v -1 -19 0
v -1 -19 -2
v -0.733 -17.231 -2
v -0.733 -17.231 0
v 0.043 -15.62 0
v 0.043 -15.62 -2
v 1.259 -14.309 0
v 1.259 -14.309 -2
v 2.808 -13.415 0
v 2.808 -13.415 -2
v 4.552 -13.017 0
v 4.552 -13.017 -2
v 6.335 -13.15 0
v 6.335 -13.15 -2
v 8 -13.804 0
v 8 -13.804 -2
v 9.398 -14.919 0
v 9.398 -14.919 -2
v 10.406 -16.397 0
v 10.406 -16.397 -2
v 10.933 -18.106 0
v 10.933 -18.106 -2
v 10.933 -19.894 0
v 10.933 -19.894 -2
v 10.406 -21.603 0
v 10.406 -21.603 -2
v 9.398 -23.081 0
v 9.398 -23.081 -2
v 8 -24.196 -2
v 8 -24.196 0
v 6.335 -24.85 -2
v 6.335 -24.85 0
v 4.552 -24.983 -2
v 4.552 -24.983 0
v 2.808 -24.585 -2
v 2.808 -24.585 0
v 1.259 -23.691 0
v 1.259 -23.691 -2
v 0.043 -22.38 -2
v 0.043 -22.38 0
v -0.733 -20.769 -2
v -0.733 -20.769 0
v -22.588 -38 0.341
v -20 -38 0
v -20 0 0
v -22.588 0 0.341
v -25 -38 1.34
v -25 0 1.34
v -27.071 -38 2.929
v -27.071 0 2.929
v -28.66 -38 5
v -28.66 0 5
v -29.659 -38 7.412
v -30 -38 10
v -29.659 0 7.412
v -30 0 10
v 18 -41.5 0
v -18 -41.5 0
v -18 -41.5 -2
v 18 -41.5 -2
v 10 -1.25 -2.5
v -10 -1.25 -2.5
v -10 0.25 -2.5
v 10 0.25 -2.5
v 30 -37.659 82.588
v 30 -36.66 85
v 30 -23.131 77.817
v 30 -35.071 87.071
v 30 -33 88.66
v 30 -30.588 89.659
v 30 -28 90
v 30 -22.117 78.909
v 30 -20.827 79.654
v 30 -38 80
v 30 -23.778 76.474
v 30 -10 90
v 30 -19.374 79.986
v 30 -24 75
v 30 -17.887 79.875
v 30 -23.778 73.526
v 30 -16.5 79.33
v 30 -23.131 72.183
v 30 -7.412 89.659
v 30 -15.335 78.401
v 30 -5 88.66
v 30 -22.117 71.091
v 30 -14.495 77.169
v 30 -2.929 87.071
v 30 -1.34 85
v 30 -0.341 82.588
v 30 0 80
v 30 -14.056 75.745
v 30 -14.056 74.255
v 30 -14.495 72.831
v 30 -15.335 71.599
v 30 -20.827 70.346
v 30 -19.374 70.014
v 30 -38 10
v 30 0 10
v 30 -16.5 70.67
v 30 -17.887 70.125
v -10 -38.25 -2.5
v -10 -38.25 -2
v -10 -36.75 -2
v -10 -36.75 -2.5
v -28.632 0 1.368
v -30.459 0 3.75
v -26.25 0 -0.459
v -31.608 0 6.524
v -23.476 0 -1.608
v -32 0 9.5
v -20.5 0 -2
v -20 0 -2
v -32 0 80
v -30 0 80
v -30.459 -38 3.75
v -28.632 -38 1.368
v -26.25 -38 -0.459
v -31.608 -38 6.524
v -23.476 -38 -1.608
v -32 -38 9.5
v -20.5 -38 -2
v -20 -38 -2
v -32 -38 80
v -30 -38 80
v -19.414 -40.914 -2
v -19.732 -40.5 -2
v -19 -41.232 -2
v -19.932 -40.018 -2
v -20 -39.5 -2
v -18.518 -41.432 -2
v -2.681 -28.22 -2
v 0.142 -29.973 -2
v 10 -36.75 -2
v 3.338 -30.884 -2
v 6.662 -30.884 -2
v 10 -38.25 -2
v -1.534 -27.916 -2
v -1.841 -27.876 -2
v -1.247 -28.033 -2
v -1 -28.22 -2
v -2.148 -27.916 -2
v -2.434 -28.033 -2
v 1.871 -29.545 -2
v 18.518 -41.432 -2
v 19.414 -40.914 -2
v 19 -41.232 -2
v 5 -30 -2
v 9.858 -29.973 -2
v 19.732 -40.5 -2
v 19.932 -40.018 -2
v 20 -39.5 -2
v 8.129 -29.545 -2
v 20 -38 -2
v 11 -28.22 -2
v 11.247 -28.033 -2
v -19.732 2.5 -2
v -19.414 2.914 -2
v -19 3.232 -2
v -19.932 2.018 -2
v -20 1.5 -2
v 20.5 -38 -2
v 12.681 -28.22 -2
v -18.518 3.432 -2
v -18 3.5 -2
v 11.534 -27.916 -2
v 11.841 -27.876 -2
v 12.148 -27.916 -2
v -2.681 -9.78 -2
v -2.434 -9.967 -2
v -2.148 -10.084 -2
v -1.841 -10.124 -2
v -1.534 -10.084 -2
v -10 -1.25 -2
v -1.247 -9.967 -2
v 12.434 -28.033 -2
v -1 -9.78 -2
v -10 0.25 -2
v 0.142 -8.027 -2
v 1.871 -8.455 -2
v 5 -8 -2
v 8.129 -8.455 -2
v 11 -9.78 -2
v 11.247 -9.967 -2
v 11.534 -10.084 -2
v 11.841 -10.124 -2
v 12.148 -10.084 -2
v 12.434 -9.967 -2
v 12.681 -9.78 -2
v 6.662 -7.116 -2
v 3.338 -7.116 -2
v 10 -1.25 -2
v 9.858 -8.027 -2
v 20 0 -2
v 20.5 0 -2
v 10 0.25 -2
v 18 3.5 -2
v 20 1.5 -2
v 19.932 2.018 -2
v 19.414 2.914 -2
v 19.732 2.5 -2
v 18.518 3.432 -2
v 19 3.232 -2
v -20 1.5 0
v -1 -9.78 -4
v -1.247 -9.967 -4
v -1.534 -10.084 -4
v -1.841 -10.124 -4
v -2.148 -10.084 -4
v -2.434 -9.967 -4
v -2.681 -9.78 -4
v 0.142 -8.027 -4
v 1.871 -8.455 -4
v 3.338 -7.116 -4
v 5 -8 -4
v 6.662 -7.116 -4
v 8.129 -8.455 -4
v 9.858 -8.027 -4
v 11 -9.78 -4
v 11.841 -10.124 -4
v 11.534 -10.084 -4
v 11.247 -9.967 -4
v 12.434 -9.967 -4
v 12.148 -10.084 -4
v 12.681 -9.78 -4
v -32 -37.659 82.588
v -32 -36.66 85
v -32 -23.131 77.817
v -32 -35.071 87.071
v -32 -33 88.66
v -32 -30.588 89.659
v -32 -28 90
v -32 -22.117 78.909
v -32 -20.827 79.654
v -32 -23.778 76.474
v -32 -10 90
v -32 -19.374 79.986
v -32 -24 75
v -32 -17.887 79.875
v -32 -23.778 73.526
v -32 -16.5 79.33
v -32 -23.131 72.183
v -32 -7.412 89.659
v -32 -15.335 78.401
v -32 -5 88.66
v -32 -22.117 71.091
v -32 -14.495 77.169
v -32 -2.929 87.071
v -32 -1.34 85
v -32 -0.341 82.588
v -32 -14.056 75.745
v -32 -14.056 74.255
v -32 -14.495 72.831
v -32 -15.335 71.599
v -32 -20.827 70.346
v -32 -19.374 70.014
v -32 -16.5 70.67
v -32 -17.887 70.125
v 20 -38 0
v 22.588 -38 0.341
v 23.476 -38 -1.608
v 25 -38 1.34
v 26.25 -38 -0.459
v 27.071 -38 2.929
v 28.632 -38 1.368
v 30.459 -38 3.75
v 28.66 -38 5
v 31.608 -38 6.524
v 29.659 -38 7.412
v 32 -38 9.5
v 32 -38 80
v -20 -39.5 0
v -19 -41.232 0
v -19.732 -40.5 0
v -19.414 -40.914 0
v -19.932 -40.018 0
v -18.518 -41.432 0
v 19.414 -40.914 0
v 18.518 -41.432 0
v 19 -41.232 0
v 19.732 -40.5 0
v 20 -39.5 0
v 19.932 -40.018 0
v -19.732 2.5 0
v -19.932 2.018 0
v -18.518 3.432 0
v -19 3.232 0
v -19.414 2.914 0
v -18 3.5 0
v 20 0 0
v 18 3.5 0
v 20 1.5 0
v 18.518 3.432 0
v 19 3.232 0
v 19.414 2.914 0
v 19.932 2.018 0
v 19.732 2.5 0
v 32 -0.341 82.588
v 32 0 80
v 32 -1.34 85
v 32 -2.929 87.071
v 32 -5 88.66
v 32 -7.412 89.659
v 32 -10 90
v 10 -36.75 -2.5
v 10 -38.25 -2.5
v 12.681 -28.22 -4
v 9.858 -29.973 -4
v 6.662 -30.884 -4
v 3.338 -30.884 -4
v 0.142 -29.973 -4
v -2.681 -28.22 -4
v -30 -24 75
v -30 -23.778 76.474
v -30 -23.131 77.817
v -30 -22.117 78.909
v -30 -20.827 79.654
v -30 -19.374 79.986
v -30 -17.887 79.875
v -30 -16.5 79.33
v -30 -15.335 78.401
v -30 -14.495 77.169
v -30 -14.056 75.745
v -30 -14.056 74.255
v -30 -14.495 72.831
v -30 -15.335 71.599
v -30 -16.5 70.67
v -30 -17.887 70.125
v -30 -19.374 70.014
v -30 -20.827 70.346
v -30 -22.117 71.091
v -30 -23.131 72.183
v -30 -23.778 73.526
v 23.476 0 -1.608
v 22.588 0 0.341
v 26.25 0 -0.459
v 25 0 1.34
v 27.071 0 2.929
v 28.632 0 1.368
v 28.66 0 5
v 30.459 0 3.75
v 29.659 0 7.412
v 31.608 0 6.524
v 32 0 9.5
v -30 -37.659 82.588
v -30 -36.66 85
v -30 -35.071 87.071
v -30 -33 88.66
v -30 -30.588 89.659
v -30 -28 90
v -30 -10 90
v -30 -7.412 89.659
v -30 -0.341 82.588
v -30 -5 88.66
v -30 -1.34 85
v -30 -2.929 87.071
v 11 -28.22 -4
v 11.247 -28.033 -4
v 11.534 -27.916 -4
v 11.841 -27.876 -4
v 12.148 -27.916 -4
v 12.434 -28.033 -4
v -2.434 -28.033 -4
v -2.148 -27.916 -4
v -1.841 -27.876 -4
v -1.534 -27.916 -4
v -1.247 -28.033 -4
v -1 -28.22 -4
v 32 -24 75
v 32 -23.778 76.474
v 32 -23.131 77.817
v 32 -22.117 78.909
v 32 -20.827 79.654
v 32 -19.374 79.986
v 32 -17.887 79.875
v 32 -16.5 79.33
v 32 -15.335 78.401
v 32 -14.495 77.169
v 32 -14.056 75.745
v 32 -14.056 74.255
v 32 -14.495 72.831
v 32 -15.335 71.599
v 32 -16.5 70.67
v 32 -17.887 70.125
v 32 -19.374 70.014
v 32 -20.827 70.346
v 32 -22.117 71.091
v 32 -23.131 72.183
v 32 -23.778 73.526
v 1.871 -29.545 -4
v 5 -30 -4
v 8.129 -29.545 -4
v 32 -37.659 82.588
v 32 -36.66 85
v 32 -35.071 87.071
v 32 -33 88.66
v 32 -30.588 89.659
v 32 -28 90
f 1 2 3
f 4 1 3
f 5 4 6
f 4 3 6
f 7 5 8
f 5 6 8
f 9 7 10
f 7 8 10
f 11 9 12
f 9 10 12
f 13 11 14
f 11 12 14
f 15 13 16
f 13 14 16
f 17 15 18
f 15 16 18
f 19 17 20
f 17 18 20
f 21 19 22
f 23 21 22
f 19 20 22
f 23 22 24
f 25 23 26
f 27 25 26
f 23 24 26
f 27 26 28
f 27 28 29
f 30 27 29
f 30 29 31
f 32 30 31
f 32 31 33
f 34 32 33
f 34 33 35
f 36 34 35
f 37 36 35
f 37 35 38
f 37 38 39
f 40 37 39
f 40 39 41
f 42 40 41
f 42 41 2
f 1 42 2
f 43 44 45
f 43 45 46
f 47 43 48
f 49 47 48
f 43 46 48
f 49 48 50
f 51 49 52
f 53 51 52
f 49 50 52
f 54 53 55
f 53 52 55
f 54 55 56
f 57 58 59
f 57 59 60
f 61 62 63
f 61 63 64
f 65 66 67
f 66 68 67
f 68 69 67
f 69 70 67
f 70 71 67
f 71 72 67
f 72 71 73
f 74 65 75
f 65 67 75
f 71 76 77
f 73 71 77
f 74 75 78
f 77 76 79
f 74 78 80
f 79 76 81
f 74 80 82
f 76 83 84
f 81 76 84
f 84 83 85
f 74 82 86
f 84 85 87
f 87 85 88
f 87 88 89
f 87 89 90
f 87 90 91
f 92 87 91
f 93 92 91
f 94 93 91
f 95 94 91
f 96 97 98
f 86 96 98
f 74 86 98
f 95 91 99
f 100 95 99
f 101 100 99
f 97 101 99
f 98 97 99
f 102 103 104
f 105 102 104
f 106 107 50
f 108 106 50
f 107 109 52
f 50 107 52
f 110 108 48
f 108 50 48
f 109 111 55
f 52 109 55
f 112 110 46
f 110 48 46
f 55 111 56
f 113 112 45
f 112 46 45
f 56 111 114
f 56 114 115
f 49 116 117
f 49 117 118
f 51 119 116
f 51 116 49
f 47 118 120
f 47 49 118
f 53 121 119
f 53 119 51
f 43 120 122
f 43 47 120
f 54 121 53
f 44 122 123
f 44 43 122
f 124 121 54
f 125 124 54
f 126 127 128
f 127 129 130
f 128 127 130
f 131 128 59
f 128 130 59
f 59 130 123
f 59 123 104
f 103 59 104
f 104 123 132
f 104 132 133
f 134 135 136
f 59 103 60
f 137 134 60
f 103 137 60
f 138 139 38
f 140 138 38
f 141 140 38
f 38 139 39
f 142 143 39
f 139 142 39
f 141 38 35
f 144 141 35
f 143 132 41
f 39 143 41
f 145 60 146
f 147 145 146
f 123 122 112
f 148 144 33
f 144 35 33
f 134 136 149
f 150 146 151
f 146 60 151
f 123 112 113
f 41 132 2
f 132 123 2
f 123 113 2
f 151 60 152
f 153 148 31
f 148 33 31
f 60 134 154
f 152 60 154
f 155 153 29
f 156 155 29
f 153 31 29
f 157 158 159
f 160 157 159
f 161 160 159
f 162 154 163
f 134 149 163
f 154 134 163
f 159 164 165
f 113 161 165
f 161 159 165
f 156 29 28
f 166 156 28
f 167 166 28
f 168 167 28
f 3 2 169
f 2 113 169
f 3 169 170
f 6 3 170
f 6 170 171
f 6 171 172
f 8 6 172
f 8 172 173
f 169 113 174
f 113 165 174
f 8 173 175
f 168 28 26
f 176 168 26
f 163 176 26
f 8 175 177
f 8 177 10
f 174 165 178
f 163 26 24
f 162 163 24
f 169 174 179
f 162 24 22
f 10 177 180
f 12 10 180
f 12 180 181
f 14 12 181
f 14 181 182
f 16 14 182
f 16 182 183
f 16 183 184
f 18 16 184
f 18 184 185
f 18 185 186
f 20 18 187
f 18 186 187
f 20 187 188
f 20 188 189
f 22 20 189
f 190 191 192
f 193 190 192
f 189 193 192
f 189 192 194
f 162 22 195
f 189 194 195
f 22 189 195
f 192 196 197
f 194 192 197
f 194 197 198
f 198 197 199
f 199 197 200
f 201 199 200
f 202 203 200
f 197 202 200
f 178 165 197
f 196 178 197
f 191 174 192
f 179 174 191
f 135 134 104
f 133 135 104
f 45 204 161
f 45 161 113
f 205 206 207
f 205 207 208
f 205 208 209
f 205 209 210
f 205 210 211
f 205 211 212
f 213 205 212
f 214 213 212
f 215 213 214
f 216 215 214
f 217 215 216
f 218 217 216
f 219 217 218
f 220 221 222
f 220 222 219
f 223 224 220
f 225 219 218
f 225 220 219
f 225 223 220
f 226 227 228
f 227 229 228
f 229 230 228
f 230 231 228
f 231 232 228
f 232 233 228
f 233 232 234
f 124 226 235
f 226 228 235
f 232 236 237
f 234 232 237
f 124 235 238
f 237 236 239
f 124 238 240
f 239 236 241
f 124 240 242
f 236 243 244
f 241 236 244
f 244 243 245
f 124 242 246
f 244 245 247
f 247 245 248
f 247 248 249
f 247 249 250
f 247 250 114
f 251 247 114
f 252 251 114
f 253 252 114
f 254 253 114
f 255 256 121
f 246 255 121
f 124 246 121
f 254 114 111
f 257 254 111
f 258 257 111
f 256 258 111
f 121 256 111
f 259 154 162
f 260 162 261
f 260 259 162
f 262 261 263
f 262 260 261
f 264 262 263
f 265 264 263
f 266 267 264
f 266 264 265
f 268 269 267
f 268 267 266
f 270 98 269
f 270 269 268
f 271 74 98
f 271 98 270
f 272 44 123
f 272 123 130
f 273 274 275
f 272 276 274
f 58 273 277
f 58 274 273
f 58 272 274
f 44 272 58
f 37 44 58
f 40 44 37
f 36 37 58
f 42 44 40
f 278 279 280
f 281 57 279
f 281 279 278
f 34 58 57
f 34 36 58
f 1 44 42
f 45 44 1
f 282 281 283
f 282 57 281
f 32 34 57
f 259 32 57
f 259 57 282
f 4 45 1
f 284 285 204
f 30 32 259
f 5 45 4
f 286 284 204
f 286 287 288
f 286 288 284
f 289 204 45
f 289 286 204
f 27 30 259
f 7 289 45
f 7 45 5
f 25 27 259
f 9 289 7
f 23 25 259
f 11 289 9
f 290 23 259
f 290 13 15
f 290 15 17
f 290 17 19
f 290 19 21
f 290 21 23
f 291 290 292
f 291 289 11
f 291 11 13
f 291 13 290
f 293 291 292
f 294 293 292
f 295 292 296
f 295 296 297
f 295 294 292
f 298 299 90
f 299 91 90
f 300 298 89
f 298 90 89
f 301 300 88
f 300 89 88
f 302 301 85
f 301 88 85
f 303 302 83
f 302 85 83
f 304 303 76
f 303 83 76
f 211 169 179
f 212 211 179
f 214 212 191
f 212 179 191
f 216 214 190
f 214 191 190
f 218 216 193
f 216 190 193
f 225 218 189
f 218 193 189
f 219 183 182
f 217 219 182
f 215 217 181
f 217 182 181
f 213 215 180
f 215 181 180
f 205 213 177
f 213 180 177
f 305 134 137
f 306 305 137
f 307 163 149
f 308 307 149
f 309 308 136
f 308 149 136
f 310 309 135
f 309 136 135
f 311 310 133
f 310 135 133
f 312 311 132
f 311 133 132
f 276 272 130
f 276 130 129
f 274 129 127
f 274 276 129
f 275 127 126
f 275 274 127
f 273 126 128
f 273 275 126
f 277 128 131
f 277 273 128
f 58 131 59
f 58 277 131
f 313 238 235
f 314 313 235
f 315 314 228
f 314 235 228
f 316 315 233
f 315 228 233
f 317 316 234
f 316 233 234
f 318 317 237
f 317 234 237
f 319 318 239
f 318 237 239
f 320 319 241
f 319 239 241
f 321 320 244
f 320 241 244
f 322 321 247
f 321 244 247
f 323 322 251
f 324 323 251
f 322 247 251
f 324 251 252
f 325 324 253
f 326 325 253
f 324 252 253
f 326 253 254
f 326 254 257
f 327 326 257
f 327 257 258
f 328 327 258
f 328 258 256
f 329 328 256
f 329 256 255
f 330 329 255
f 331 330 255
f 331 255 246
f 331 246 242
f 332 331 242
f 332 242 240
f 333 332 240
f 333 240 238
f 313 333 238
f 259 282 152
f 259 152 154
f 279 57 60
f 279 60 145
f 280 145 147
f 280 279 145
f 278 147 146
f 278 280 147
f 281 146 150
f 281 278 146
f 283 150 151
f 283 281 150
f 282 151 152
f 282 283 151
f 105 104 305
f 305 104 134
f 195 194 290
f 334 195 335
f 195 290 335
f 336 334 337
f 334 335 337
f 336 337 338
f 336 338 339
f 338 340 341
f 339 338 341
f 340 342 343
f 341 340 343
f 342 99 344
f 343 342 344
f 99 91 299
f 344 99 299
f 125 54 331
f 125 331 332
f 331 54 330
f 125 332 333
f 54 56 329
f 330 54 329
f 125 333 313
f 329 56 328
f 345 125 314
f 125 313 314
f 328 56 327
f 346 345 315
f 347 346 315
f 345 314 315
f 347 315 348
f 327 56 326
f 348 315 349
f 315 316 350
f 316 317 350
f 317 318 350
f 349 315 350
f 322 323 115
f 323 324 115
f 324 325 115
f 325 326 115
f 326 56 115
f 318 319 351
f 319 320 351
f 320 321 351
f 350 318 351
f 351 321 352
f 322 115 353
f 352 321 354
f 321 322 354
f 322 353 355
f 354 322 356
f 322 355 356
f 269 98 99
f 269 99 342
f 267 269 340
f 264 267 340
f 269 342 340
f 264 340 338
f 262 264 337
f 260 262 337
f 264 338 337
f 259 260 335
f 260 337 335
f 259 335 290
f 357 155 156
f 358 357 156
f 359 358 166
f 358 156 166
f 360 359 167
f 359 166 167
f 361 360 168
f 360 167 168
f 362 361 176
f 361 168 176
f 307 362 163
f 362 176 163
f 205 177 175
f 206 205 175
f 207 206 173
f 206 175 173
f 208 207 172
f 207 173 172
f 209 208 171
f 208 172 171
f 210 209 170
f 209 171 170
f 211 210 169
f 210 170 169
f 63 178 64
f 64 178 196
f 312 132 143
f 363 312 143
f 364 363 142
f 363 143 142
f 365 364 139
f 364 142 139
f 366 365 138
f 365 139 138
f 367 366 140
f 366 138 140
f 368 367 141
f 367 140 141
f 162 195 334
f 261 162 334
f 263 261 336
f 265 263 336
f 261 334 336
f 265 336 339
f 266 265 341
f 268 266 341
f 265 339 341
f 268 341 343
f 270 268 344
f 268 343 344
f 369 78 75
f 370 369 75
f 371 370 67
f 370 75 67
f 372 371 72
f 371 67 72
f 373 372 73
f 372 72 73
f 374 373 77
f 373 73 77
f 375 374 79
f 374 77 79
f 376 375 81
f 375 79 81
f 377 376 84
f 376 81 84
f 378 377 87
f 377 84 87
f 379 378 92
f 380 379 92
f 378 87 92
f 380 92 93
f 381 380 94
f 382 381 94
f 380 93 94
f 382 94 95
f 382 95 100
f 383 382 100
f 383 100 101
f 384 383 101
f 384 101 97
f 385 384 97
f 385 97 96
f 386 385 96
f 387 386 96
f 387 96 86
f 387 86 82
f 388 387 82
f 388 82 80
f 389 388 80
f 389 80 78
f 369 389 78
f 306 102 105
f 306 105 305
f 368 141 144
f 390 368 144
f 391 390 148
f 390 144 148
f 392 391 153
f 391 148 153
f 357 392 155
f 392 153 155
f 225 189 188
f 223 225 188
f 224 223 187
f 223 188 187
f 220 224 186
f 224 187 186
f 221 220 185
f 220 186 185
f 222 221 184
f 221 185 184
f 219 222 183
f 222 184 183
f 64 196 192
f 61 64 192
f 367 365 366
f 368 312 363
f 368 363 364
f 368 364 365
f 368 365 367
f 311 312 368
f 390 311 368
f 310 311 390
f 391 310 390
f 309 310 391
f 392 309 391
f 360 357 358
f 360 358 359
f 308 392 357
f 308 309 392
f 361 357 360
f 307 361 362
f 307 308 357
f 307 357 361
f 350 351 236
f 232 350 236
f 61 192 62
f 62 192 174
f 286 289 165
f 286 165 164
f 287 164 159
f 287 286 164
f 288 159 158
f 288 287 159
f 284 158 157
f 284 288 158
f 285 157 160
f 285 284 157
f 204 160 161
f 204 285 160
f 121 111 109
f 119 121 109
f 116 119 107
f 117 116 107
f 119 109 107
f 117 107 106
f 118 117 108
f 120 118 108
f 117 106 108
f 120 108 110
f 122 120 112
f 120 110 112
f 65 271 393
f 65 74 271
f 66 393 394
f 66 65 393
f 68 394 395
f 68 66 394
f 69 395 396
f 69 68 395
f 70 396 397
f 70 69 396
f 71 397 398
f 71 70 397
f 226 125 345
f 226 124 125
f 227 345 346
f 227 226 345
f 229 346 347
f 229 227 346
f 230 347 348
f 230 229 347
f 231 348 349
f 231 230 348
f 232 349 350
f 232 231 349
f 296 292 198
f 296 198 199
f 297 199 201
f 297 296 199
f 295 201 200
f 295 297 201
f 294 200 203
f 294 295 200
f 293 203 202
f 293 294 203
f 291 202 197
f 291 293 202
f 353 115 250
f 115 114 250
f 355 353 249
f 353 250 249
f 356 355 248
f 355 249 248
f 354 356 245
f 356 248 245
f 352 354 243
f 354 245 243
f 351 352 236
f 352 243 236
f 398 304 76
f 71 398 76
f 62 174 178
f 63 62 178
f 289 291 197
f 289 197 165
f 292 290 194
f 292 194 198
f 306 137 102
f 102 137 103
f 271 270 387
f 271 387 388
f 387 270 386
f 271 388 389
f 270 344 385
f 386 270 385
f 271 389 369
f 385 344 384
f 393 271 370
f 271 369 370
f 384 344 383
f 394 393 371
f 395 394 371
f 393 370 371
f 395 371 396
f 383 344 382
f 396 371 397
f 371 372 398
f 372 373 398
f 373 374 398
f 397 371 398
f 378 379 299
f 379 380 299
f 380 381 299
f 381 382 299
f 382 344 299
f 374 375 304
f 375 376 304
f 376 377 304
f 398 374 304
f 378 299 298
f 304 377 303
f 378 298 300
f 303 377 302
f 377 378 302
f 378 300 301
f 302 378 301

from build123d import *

# Parameters (mm, degrees)
F1_DEPTH  = 38
F3_D      = 12
F5_DEPTH  = 2
F6_R      = 10
F8_DEPTH  = 0.5
F10_DEPTH = 2
F12_D     = 10


with BuildPart() as f1:
    # F0 (on Front) → F1 (new body)
    with BuildSketch(Plane.XZ):
        with BuildLine():
            Line((20, 0), (0, 0))
            Line((0, 0), (-20, 0))
            ThreePointArc((-20, 0), (-27.0710678119, 2.9289321881), (-30, 10))
            Line((-30, 10), (-30, 90))
            Line((-30, 90), (-32, 90))
            Line((-32, 90), (-32, 9.5))
            ThreePointArc((-32, 9.5), (-28.6317279836, 1.3682720164), (-20.5, -2))
            Line((-20.5, -2), (0, -2))
            Line((0, -2), (20.5, -2))
            ThreePointArc((20.5, -2), (28.6317279836, 1.3682720164), (32, 9.5))
            Line((32, 9.5), (32, 90))
            Line((32, 90), (30, 90))
            Line((30, 90), (30, 10))
            ThreePointArc((30, 10), (27.0710678119, 2.9289321881), (20, 0))
        make_face()
    extrude(amount=F1_DEPTH)

    # F3 (through all)
    with Locations(Plane.XY):
        with Locations((5, -19)):
            Hole(F3_D / 2)

    # F4 (on face) → F5 (join)
    with BuildSketch(Plane(origin=(0, 0, -2), x_dir=(1, 0, 0), z_dir=(0, 0, -1))):
        with BuildLine():
            ThreePointArc((-1, 28.2195444573), (5, 30), (11, 28.2195444573))
            ThreePointArc((11, 28.2195444573), (11.8405728739, 27.8759539642), (12.6811457479, 28.2195444573))
            ThreePointArc((12.6811457479, 28.2195444573), (5, 31), (-2.6811457479, 28.2195444573))
            ThreePointArc((-2.6811457479, 28.2195444573), (-1.8405728739, 27.8759539642), (-1, 28.2195444573))
        make_face()
        with BuildLine():
            ThreePointArc((11, 9.7804555427), (5, 8), (-1, 9.7804555427))
            ThreePointArc((-1, 9.7804555427), (-1.8405728739, 10.1240460358), (-2.6811457479, 9.7804555427))
            ThreePointArc((-2.6811457479, 9.7804555427), (5, 7), (12.6811457479, 9.7804555427))
            ThreePointArc((12.6811457479, 9.7804555427), (11.8405728739, 10.1240460358), (11, 9.7804555427))
        make_face()
    extrude(amount=F5_DEPTH)

    # F6
    f6_edges = [f1.edges().sort_by_distance(p)[0] for p in [
        (-31, -38, 90),
        (31, -38, 90),
        (-31, 0, 90),
        (31, 0, 90),
    ]]
    fillet(f6_edges, radius=F6_R)

    # F7 (on face) → F8 (join)
    with BuildSketch(Plane(origin=(0, 0, -2), x_dir=(1, 0, 0), z_dir=(0, 0, -1))):
        Polygon((10, 36.75), (10, 37.5), (10, 38.25), (-10, 38.25), (-10, 36.75), align=None)
        Polygon((10, -0.25), (10, 0.5), (10, 1.25), (-10, 1.25), (-10, -0.25), align=None)
    extrude(amount=F8_DEPTH)

    # F9 (on face) → F10 (join)
    with BuildSketch(Plane.XY):
        with BuildLine():
            Line((-20, 1.5), (-20, 0))
            Line((-20, 0), (20, 0))
            Line((20, 0), (20, 1.5))
            ThreePointArc((20, 1.5), (19.4142135624, 2.9142135624), (18, 3.5))
            Line((18, 3.5), (-18, 3.5))
            ThreePointArc((-18, 3.5), (-19.4142135624, 2.9142135624), (-20, 1.5))
        make_face()
        with BuildLine():
            ThreePointArc((18, -41.5), (19.4142135624, -40.9142135624), (20, -39.5))
            Line((20, -39.5), (20, -38))
            Line((20, -38), (-20, -38))
            Line((-20, -38), (-20, -39.5))
            ThreePointArc((-20, -39.5), (-19.4142135624, -40.9142135624), (-18, -41.5))
            Line((-18, -41.5), (18, -41.5))
        make_face()
    extrude(amount=-F10_DEPTH)

    # F12 (through all)
    with Locations(Plane.YZ.offset(32)):
        with Locations((-19, 75)):
            Hole(F12_D / 2)


solid = f1.part
